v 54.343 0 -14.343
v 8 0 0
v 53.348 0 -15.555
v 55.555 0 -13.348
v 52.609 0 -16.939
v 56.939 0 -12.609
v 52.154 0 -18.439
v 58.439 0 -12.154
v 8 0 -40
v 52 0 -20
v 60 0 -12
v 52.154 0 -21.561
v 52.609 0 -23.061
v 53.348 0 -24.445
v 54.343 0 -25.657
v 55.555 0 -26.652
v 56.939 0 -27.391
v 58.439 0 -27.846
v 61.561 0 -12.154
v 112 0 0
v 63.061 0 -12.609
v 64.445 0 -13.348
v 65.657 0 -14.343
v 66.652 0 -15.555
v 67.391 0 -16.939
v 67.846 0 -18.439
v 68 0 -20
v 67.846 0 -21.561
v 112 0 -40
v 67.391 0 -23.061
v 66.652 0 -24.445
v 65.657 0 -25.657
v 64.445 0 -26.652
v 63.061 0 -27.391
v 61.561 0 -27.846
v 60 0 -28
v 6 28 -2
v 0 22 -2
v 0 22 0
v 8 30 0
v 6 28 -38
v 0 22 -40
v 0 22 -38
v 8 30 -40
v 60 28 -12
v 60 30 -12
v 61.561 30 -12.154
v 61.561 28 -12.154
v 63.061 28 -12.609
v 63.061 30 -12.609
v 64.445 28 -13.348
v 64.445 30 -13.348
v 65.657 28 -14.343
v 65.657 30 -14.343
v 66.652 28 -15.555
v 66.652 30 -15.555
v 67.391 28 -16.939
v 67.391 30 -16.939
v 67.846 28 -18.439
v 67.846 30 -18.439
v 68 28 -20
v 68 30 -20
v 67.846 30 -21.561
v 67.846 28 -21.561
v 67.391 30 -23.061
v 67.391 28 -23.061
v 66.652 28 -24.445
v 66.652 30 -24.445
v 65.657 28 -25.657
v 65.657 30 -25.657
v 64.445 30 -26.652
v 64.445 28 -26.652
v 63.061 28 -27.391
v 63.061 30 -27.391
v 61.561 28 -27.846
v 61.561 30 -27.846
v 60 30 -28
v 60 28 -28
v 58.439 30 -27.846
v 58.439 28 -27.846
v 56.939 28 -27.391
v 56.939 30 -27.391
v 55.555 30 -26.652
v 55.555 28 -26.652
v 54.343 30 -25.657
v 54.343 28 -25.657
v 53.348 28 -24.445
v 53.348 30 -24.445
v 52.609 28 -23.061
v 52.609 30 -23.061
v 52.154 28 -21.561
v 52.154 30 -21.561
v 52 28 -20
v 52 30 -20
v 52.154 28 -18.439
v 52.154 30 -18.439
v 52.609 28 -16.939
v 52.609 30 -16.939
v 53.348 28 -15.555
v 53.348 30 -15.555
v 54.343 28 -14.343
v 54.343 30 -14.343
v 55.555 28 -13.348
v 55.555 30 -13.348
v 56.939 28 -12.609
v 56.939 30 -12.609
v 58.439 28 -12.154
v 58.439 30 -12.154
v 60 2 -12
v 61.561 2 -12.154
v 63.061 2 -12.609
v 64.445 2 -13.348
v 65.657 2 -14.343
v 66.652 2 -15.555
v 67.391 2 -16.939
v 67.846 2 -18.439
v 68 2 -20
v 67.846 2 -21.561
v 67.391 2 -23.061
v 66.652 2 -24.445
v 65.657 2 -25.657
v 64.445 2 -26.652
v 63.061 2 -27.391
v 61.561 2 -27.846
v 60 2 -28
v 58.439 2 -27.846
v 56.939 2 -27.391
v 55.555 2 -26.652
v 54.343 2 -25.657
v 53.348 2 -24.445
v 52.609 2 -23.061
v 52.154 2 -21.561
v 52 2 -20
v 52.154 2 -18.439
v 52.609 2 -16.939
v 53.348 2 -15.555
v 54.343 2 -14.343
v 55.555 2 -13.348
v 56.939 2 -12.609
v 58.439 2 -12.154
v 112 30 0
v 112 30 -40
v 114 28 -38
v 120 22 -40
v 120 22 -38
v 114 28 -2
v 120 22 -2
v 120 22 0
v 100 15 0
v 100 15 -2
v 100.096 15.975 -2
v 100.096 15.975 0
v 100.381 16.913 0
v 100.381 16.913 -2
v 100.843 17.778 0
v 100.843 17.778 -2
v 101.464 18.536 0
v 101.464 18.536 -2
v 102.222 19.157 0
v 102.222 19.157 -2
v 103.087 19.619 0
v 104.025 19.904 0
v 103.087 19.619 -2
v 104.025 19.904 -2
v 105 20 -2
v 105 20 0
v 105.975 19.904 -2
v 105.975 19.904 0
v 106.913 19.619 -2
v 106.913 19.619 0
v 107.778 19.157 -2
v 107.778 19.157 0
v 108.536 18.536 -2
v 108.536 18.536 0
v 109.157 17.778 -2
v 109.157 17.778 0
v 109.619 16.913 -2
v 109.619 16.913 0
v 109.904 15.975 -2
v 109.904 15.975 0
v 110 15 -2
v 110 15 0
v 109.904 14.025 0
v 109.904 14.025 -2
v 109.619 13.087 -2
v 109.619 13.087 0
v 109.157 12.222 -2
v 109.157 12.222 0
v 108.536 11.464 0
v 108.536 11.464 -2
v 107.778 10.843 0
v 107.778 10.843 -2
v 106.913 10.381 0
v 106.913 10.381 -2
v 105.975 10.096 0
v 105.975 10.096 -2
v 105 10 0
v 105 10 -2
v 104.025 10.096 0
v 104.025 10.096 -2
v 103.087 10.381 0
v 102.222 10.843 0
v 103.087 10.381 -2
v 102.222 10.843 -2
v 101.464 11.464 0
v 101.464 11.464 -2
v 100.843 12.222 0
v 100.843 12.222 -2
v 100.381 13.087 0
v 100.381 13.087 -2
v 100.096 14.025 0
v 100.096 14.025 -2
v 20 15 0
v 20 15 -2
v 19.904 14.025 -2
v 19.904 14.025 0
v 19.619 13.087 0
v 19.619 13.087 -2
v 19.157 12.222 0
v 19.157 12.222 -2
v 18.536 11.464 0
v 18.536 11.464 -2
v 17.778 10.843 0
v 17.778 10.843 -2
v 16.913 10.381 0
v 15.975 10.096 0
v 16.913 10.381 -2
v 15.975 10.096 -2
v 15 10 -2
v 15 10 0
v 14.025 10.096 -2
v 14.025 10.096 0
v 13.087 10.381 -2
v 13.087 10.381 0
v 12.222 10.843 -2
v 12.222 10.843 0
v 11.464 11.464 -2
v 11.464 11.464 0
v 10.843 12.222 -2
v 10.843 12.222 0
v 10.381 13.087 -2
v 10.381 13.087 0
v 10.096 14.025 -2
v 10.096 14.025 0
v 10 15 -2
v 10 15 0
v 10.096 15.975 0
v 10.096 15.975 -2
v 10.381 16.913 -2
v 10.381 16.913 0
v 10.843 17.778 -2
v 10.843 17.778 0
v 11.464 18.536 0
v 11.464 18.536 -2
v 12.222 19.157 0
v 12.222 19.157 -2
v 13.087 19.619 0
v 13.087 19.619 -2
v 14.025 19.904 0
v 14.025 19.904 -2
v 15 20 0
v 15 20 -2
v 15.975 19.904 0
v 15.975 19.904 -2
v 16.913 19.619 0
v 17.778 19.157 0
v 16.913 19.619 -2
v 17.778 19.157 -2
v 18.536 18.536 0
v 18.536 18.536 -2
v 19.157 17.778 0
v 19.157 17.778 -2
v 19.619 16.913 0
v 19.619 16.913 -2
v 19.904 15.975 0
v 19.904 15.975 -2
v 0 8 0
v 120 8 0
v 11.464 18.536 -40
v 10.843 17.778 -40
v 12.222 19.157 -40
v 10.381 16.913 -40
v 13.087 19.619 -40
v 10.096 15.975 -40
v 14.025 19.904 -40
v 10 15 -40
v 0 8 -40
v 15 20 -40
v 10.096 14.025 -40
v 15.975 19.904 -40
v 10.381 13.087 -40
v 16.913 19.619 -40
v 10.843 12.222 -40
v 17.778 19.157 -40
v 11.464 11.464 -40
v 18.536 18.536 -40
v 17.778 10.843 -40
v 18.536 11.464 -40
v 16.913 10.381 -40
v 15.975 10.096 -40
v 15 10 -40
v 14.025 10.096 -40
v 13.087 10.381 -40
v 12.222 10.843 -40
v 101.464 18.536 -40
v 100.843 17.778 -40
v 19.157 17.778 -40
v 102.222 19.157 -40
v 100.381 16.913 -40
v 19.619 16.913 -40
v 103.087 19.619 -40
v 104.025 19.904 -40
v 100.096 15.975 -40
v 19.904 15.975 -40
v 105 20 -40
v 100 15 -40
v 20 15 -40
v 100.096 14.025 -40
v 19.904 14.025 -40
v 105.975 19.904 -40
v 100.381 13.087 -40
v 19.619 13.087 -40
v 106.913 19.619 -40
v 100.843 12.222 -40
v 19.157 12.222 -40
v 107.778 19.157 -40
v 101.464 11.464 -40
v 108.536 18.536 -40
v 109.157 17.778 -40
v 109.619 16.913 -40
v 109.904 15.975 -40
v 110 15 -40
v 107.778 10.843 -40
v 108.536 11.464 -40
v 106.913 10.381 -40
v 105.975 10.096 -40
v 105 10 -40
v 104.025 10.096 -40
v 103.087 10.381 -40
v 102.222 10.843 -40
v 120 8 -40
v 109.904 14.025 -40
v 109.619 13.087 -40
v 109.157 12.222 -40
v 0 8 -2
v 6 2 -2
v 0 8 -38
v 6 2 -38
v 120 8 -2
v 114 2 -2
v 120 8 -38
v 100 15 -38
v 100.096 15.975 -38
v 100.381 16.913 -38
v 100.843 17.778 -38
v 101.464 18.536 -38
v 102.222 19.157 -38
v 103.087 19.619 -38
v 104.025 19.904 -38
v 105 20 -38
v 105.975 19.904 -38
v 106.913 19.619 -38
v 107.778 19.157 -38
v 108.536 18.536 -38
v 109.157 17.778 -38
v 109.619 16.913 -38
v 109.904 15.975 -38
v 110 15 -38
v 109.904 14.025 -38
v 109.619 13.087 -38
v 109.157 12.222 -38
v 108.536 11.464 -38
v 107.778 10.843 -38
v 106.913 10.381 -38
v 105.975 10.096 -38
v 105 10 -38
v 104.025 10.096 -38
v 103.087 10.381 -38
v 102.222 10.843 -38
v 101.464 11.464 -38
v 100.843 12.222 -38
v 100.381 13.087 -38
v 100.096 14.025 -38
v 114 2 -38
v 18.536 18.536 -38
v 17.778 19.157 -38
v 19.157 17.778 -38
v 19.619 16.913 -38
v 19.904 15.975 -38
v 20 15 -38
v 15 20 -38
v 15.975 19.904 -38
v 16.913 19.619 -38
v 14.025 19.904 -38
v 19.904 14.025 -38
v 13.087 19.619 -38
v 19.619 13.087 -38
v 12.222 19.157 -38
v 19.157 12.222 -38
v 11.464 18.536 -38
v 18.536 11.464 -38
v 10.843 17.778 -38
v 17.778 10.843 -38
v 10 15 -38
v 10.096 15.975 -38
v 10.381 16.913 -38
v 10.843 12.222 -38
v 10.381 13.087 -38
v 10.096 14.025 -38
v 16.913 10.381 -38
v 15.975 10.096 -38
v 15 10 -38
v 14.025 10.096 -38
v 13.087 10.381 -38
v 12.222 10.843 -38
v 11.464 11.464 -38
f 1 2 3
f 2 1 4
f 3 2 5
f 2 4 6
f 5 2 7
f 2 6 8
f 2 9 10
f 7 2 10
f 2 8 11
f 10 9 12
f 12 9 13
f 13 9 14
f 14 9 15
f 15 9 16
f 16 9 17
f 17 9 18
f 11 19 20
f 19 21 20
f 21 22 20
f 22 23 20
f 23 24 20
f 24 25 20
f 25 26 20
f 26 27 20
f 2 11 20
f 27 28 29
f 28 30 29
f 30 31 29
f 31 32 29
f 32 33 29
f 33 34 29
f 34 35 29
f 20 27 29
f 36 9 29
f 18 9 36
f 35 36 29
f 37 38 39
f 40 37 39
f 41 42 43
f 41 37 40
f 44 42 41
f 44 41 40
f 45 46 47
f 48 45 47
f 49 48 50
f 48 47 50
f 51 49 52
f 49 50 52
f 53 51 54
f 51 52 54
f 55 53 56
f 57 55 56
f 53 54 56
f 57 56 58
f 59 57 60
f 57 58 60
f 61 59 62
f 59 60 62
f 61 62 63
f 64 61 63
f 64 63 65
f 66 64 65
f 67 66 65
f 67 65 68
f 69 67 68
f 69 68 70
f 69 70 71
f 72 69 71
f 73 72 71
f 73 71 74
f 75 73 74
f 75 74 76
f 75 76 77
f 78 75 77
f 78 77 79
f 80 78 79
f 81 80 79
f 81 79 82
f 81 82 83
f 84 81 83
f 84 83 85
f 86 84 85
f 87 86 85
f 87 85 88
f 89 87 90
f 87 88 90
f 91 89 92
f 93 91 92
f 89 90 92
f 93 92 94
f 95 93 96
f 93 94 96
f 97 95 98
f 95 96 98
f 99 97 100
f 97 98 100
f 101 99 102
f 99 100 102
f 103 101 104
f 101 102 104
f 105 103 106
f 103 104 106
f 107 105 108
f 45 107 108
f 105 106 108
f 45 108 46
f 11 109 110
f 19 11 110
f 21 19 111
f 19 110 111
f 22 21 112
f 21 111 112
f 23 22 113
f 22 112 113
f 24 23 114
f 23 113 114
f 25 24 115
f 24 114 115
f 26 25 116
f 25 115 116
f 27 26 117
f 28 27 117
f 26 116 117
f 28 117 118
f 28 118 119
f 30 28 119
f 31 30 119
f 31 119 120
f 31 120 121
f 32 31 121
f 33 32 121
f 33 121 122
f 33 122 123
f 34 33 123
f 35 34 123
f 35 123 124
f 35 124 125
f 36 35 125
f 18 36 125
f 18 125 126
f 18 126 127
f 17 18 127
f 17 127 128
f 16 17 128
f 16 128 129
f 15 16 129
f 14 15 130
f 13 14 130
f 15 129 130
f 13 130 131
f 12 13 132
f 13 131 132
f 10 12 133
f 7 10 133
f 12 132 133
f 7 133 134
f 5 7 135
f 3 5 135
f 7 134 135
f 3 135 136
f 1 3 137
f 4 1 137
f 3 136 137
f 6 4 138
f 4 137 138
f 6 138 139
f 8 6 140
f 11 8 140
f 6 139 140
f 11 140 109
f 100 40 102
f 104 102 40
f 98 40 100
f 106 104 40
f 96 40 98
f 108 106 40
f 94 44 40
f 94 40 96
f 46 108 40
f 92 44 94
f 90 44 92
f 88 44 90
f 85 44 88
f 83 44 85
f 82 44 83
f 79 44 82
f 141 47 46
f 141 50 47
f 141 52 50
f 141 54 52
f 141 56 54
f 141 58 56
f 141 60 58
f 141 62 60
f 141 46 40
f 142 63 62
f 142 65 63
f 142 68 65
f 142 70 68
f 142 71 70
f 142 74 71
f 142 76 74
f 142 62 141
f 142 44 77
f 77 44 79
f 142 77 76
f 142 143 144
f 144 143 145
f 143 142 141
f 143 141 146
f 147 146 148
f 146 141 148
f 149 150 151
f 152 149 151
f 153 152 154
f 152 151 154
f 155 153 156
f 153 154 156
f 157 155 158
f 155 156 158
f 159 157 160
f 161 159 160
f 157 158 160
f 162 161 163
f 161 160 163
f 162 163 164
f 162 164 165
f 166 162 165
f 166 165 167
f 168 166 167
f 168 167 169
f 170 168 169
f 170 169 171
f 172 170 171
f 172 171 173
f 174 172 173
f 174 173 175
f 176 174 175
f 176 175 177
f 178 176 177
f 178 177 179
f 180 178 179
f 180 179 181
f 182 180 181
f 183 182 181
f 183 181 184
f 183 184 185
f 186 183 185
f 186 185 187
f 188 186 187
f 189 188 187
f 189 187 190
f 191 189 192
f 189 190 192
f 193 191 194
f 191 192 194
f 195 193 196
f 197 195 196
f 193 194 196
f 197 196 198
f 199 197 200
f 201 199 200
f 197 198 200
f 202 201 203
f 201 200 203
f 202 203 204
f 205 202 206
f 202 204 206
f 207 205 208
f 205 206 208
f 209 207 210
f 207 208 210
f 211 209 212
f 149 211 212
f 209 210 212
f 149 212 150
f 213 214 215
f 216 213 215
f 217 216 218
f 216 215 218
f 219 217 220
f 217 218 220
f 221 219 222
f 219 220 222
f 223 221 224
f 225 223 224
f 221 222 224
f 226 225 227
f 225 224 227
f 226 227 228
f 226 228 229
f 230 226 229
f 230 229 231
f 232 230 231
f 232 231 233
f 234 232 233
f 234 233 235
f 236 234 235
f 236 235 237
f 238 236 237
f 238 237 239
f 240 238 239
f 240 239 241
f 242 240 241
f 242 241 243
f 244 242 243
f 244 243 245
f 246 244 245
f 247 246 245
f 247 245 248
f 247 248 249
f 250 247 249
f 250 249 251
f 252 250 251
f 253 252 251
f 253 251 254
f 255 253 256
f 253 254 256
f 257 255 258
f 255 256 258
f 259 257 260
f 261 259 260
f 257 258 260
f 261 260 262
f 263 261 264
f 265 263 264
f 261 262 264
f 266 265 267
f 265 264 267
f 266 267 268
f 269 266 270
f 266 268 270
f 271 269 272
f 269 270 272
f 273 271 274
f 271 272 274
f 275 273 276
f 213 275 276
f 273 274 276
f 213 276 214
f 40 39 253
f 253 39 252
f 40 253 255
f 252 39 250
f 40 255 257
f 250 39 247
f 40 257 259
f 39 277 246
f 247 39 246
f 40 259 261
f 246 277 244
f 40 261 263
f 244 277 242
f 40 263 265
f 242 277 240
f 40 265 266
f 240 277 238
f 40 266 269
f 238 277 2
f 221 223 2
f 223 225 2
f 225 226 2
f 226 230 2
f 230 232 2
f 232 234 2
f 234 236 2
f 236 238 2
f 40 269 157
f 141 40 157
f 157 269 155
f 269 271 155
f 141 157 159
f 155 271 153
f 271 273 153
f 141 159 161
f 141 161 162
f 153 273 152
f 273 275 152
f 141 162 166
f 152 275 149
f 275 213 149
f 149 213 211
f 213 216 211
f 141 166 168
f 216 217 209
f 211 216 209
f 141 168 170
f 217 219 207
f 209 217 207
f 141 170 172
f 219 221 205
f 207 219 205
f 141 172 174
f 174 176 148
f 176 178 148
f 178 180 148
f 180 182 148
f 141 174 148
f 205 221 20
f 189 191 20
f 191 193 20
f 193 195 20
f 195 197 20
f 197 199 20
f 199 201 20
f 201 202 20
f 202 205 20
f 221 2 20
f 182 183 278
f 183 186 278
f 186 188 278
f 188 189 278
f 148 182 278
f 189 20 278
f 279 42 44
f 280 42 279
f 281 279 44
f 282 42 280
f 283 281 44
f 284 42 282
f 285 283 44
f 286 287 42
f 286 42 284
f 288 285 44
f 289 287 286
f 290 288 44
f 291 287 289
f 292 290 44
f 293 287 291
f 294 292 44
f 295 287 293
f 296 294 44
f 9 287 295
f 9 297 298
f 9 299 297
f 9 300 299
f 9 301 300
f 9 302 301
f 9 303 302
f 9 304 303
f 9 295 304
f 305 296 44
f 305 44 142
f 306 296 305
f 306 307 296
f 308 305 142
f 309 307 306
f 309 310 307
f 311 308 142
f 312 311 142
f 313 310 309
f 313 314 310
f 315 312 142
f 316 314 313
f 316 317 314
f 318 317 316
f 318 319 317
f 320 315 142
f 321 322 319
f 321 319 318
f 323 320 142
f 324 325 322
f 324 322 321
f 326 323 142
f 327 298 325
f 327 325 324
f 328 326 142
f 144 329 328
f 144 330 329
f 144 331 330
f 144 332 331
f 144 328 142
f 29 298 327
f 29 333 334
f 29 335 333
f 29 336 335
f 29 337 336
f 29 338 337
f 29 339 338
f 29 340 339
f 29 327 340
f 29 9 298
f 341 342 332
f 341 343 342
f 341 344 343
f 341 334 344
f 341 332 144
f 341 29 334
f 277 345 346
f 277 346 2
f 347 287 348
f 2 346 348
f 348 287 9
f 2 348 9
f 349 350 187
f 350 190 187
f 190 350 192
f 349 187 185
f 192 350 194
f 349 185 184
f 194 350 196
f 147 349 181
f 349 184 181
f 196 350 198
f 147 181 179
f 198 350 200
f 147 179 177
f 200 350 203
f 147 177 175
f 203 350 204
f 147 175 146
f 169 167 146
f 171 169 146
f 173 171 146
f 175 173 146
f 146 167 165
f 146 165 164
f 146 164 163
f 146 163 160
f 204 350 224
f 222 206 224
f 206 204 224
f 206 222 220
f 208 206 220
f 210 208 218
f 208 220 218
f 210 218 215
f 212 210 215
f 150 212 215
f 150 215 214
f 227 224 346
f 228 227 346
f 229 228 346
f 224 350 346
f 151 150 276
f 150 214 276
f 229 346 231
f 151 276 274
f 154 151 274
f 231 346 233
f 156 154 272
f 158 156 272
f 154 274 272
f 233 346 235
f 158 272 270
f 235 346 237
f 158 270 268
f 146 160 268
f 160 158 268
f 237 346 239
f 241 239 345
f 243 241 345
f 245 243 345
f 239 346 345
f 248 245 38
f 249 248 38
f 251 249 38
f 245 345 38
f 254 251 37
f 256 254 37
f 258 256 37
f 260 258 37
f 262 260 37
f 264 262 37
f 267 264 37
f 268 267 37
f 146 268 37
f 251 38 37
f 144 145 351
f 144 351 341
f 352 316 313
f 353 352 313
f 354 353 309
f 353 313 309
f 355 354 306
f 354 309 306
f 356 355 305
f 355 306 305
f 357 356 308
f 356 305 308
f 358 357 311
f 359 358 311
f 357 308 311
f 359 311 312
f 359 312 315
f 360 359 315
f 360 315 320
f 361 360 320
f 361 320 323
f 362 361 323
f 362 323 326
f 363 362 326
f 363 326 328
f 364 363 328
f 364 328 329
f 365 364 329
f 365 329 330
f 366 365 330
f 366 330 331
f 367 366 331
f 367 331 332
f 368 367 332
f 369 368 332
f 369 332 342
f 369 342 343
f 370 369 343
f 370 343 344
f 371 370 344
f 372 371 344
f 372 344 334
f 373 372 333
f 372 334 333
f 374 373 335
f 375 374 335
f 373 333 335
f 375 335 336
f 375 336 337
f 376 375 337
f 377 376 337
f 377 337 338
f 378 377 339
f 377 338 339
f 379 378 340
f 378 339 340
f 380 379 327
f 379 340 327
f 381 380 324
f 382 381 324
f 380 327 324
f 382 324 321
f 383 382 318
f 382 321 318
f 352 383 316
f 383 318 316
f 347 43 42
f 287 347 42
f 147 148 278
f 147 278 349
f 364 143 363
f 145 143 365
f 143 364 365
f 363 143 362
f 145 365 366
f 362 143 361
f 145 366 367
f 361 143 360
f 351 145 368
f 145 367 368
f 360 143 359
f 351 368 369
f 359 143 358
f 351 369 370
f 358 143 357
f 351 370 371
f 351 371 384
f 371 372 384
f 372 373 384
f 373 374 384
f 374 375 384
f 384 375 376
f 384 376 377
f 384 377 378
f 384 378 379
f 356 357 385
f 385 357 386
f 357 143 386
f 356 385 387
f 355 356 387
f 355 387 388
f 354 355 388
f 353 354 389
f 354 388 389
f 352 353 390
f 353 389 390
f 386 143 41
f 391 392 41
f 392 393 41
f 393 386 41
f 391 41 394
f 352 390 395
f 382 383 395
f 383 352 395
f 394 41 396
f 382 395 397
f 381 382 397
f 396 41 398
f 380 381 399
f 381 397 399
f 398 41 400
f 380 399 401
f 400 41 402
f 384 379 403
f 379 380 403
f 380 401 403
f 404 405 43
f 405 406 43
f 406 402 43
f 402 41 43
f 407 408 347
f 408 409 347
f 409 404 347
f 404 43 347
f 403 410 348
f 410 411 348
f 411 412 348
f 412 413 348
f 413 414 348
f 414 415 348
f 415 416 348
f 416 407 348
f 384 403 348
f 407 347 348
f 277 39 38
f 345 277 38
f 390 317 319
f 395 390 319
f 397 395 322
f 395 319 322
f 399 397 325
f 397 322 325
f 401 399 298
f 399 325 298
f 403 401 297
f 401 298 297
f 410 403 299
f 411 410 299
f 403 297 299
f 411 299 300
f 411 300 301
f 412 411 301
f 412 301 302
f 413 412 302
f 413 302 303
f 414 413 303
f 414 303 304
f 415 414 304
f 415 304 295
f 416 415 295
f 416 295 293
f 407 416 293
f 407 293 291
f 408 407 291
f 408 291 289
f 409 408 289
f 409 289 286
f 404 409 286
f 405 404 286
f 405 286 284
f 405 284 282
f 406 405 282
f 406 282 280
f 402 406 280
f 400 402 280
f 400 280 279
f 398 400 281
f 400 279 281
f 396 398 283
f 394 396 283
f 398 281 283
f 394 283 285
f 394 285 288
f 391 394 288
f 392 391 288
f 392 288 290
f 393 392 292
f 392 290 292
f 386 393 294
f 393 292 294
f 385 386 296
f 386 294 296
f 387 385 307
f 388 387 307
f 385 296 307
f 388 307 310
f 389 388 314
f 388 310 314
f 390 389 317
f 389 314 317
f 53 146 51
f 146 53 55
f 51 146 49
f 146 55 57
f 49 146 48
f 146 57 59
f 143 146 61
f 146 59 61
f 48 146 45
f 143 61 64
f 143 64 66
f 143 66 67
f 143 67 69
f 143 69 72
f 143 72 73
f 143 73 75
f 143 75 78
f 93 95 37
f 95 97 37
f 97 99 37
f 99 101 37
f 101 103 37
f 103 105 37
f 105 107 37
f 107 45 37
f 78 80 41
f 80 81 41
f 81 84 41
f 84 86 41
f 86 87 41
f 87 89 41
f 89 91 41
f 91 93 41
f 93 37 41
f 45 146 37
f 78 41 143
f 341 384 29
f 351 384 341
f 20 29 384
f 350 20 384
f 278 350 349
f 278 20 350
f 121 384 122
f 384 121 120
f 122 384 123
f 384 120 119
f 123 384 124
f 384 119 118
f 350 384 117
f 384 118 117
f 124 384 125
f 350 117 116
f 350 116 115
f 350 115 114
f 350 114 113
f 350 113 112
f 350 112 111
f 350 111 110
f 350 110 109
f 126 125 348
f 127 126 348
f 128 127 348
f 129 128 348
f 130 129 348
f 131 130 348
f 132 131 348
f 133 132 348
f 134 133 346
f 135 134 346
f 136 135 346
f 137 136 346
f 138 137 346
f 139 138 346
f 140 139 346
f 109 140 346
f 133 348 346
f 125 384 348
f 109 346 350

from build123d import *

# Parameters (mm, degrees)
SKETCH1_W           = 120
SKETCH1_H           = 40
BOSS_EXTRUDE3_DEPTH = 30
SKETCH3_R           = 5
CUT_EXTRUDE2_DEPTH  = 131
CUT_EXTRUDE3_DEPTH  = 120
SKETCH6_R           = 8
CUT_EXTRUDE4_DEPTH  = 120
CHAMFER2_SIZE       = 8


with BuildPart() as part:
    # Sketch1 → Boss-Extrude3 (new body)
    with BuildSketch(Plane(origin=(0, 0, 0), x_dir=(1, 0, 0), z_dir=(0, 1, 0))):
        with Locations((60, 20)):
            Rectangle(SKETCH1_W, SKETCH1_H)
    extrude(amount=BOSS_EXTRUDE3_DEPTH)

    # Sketch3 → Cut-Extrude2 (cut, through all)
    with BuildSketch(Plane(origin=(0, 0, -40), x_dir=(-1, 0, 0), z_dir=(0, 0, -1))):
        with Locations((-105, 15)):
            Circle(SKETCH3_R)
        with Locations(Location((-15, 15, 0), (0, 0, 180))):
            Circle(SKETCH3_R)
    extrude(amount=-CUT_EXTRUDE2_DEPTH, mode=Mode.SUBTRACT)

    # 3DSketch1 → Cut-Extrude3 (cut)
    with BuildSketch(Plane(origin=(0, 28, -2), x_dir=(0, -0.5854905538443583, -0.8106792283998812), z_dir=(-1, 0, 0))):
        Polygon((0, 0), (29.184452222, -21.077659938), (44.407206622, 0), (15.2227544, 21.077659938), align=None)
    extrude(amount=-CUT_EXTRUDE3_DEPTH, mode=Mode.SUBTRACT)

    # Sketch6 → Cut-Extrude4 (cut)
    with BuildSketch(Plane(origin=(0, 30, 0), x_dir=(1, 0, 0), z_dir=(0, 1, 0))):
        with Locations(Location((60, 20, 0), (0, 0, 270))):
            Circle(SKETCH6_R)
    extrude(amount=-CUT_EXTRUDE4_DEPTH, mode=Mode.SUBTRACT)

    # Chamfer2
    # the kernel refuses this chamfer: 8 mm, written as the material it takes off along each edge
    with BuildSketch(Plane(origin=(0, 0, -60.573463904), x_dir=(-0.027495876610586372, 0.9996219169112968, 0), z_dir=(0, 0, 1)), Plane(origin=(120, 30, 20.573463904), x_dir=(-0.9996219169112968, 0.02749587661058651, 0), z_dir=(0, 0, -1))) as chamfer2_piece_1:
        Polygon((CHAMFER2_SIZE * 0.999621916911, -CHAMFER2_SIZE * 0.0274958766106), (-CHAMFER2_SIZE * 0.0274958766106, -CHAMFER2_SIZE * 0.999621916911), (0, 0), align=None)
    extrude(amount=81.146927807, mode=Mode.SUBTRACT)
    with BuildSketch(Plane(origin=(0, 30, -60.573463904), x_dir=(-0.027495876610586365, -0.9996219169112968, 0), z_dir=(0, 0, 1)), Plane(origin=(120, 0, 20.573463904), x_dir=(-0.9996219169112968, -0.02749587661058639, 0), z_dir=(0, 0, -1))) as chamfer2_piece_2:
        Polygon((CHAMFER2_SIZE * 0.999621916911, CHAMFER2_SIZE * 0.0274958766106), (-CHAMFER2_SIZE * 0.0274958766106, CHAMFER2_SIZE * 0.999621916911), (0, 0), align=None)
    extrude(amount=81.146927807, mode=Mode.SUBTRACT)


solid = part.part
